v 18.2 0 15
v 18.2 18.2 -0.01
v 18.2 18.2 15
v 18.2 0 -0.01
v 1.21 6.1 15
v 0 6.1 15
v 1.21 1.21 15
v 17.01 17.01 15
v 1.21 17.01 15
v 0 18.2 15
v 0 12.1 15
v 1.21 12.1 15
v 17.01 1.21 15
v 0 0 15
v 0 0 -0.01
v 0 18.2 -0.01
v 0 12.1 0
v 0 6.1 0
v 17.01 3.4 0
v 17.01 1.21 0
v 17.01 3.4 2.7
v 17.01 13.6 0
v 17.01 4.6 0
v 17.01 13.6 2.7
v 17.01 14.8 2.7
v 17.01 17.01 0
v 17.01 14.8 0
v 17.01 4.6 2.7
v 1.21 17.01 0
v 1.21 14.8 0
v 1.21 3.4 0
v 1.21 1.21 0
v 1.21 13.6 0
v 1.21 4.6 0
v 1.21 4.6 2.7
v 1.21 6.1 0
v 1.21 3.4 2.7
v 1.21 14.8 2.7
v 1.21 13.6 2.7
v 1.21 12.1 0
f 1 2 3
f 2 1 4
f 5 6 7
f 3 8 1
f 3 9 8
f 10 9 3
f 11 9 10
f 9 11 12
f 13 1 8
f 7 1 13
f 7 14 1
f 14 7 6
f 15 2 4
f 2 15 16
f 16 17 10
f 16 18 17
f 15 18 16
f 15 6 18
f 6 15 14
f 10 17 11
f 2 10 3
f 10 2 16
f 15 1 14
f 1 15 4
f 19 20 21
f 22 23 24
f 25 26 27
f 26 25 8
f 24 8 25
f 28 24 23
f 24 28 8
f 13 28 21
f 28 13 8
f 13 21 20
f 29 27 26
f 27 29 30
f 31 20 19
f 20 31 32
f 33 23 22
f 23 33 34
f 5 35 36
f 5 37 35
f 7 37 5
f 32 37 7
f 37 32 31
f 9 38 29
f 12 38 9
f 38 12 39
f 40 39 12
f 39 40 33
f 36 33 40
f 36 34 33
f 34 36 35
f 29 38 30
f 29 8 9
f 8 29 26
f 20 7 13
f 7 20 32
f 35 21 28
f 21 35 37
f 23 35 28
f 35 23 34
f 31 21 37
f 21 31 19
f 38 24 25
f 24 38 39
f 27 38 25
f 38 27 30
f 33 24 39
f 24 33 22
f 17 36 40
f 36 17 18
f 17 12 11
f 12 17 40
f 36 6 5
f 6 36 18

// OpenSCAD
// file: ../Base/Rotation.scad
// Fischertechnik Box Foundation
// Geometry Helpers Rotation

include <PlacementOptions.scad>

// getRotatedSpace(space, rotation=NoRotation)
// Rotates the space dependent on the specified rotation

function getRotatedSpace(space, rotation=NoRotation) = [
    (rotation == Rotate90 || rotation == Rotate270) ? space.y : space.x,
    (rotation == Rotate90 || rotation == Rotate270) ? space.x : space.y
];

// Rotates the given space around the fixed left lower corner
// space = the space the children needs as width/depth list [width,depth]
// rotation = 0 Rotate0 degrees, 1 Rotate90 degrees, 2 Rotate180 degrees, 3 Rotate270 degrees (equivalent to -90)

module RotateFix(space, rotation=NoRotation) {
    dy = (rotation == Rotate0 || rotation == Rotate270) ? 0 :
        (rotation == Rotate90) ? space.x :
        space.y;
    dx = (rotation < Rotate180) ? 0 :
        (rotation == Rotate180) ? space.x :
        space.y;
    
    translate([dx, dy, 0])
        rotate([0, 0, rotations[rotation]])
            children();
}
// file: ../Base/Alignment.scad
// Fischertechnik Box Foundation
// Geometry Helpers Alignment

include <PlacementOptions.scad>

// getAlignedX(elementWidth, spaceWidth, align=AlignRight, offset=0)
// Gets the aligned X offset of an element with the given
// width in the given space.
// elementWidth = The width of the element to positon
// spaceWidth = The space where the element should be aligned
// align = 0 AlignLeft, 1 AlignCenter, 2 AlignRight
// offset = an optional offset from the aligned position. When
// aligned left or centered, then positive values are in X direction.
// When aligned right then positive values are in negative X direction.

function getAlignedX(elementWidth, spaceWidth, align=AlignRight, offset=0) =
    (align == AlignLeft) ?
        offset :
        ((align == AlignCenter) ?
        (spaceWidth - elementWidth)/2 + offset :
        spaceWidth - offset - elementWidth);

// getAlignedY(elementDepth, spaceDepth, align=AlignTop, offset=0)
// Gets the aligned Y offset of an element with the given
// depth in the given space.
// elementDepth = The depth of the element to positon
// spaceDepth = The space where the element should be aligned
// align = 0 AlignBottom, 1 AlignCenter, 2 AlignTop
// offset = an optional offset from the aligned position. When
// aligned bottom or centered, then positive values are in Y direction.
// When aligned top then positive values are in negative Y direction.

function getAlignedY(elementDepth, spaceDepth, align=AlignTop, offset=0) =
    (align == AlignBottom) ?
        offset :
        ((align == AlignCenter) ?
        (spaceDepth - elementDepth)/2 + offset :
        spaceDepth - offset - elementDepth);
// file: ../Base/PlacementOptions.scad
// Fischertechnik Box Foundation
// Placement Options

// Alignment
NoAlign = 0;
AlignLeft = 1;
AlignBottom = 2;
AlignCenter = 3;
AlignRight = 4;
AlignTop = 5;

// Element rotation degree steps
rotations = [0, -90, -180, -270];

// Rotation
NoRotation = 0;
Rotate0 = 0;
Rotate90 = 1;
Rotate180 = 2;
Rotate270 = 3;

// Docking (seen from above)
NoDock = -1;
DockLeft = 0;
DockTop = 1;
DockRight = 2;
DockCorner = 2;
DockBottom = 3;

// Web corners
LowerLeft = 0;
UpperLeft = 1;
UpperRight = 2;
LowerRight = 3;

// Web position relative to corner
LeftOfCorner = 0;
RightOfCorner = 1;
// file: ../Base/Boxes.scad
// Fischertechnik Box Foundation
// Pre-designed Boxes

use <Constants.scad>

include <PlacementOptions.scad>

box190Width = 190;
box190Depth = 130;
box130Width = 130;
box130Depth = 95;

// Values are from an original ec3 box
topBottomDifference = 1.5;
outerHeight = 40;
baseThickness = 1.8;
innerHeight = outerHeight - baseThickness;
stackExcess = 5.7;
radius = 3.5;
wallThickness = 1.5;
tolerance = 0.2;

boxWallThickness = wallThickness;
boxBaseThickness = baseThickness;
boxWebWidth = 3.0;

// getBoxWallThickness()
// Gets the wall thickness of a Fischertechnik Box
function getBoxWallThickness() = boxWallThickness;

// getBoxUsageHeight(height = 38.2)
// Gets the usable height of a Fischertechnik box
// height = Outer height of the box from the bottom to the upper edge.
function getBoxUsageHeight(height = outerHeight) = height - baseThickness - stackExcess;

// getBoxInnerHeight()
// Gets the inner height of a Fischertechnik box, including the stack excess
function getBoxInnerHeight() = innerHeight;

// getBoxBaseThickness()
// Gets the thickness of the Fischertechnik box base.
function getBoxBaseThickness() = boxBaseThickness;

// getBoxWebWidth()
// Gets the width of a box web
function getBoxWebWidth() = boxWebWidth;

// getBox190Space()
// Gets the usable inner space of a Box 190 as an x/y-list
function getBox190Space() = [
    box190Width - 2*getBoxWallThickness() - topBottomDifference, 
    box190Depth - 2*getBoxWallThickness() - topBottomDifference ];

// RoundedCornerPlate(width, depth, height, radius)
// Creates a body plate with rounded corners for a box. Used
// also to create the complete box with the hull module.
// width = Width of the plate
// depth = depth of the plate 
// height = thickness of the plate
// radius = radius of the rounded corner
module RoundedCornerPlate(width, depth, height, radius) {
    translate([radius, radius])
    hull() {
        w = width-2*radius;
        d = depth-2*radius;
        cube([w, d, height]);
        cylinder(height, r=radius, $fn=getFragments());
        translate([w, 0])
            cylinder(height, r=radius, $fn=getFragments());
        translate([w, d])
            cylinder(height, r=radius, $fn=getFragments());
        translate([0, d])
            cylinder(height, r=radius, $fn=getFragments());
    }
}

// BoxBase(width, depth)
// Creates an empty stackable Fischertechnik compatible box
// width = Outer width of the box (190, 130, ...)
// depth = Outer depth of the box (130, 95, ...)

module BoxBase(width, depth, height=outerHeight) {    
    thinPlate = 0.01;

    innerHeight = height - baseThickness;    
    
    module Body(tolerance=tolerance) {
        hull() {
            // Bottom with tolerance to fit into the original boxes when stacked
            translate([-wallThickness+tolerance, -wallThickness+tolerance, -baseThickness])
                RoundedCornerPlate(width-topBottomDifference-2*tolerance, depth-topBottomDifference-2*tolerance, thinPlate, radius);
            
            // Top
            translate([-wallThickness-topBottomDifference/2, -wallThickness-topBottomDifference/2, innerHeight-thinPlate])
                RoundedCornerPlate(width, depth, thinPlate, radius);
         }
    }

    module Cutoff() {
        hull() {
            coWidth = width - 2*wallThickness;
            coDepth = depth - 2*wallThickness;
            
            // Bottom
            RoundedCornerPlate(coWidth-topBottomDifference, coDepth-topBottomDifference, thinPlate, radius);

            // Top
            translate([-topBottomDifference/2, -topBottomDifference/2, innerHeight+thinPlate]) 
                RoundedCornerPlate(coWidth, coDepth, thinPlate, radius);
        }
    }
    
    difference() {        
        Body();
        Cutoff();
        stackOffset = innerHeight - stackExcess;
        translate([0, 0, stackOffset + baseThickness])
            Body(tolerance=0);
    }
}

// Creates the Fischertechnik empty box 130x190 mm and places it at position 0,0
// 190x130 are the outer sizes, the inner space is slightly smaller. Use getBox190Space() to get the inner sizes.
// The box is positioned that the usable inner space is at the 0,0,0 position.

module Box190() {
    BoxBase(box190Width, box190Depth);
}

// Gets the usable inner space of a Box 130 as an x/y-list
function getBox130Space() = [
    box130Width - 2*getBoxWallThickness() - topBottomDifference, 
    box130Depth - 2*getBoxWallThickness() - topBottomDifference ];

// Creates the Fischertechnik empty box 95x130 mm and places it at position 0,0
// 190x130 are the outer sizes, the inner space is slightly smaller. Use getBox190Space() to get the inner sizes.
// The box is positioned that the usable inner space is at the 0,0,0 position.

module Box130() {
    BoxBase(box130Width, box130Depth);
}

// Creates a web at the specified box walls
// corner 0 = LowerLeft, 1 = UpperLeft, 2 = UpperRight, 3 = LowerRight
// side 0 = LeftOfCorner, 1 = RightOfCorner
// distance = Distance in mm from the corner
// boxSpace = inner width and depth of the box (default: Box 190)
// webWidth = length of the web (default is 3 mms)
// webThickness = thickness of the web (default is 1 mm)
// height = Height of the web (standard is getBoxUsageHeight())
// sink = How much of the web is sunk into the wall

module BoxWeb(
    corner, 
    side, 
    distance, 
    boxSpace=getBox190Space(), 
    webWidth=getBoxWebWidth(), 
    webThickness=1.0, 
    height=getBoxUsageHeight(),
    sink = getBoxWallThickness()/2) {
    width = (corner % 2 == 0) ? 
            (side == LeftOfCorner ? webWidth : webThickness) :
            (side == LeftOfCorner ? webThickness : webWidth);

    depth = (corner % 2 == 0) ? 
            (side == RightOfCorner ? webWidth : webThickness) :
            (side == RightOfCorner ? webThickness : webWidth);
    
    xDiff = corner == LowerLeft ? 
                (side == LeftOfCorner ? -sink : distance) :
            (corner == UpperLeft ?                
                (side == LeftOfCorner ? distance : -sink) :
            (corner == UpperRight ?
                (side == LeftOfCorner ? boxSpace.x-webWidth+sink : boxSpace.x-distance-webThickness) :
                (side == LeftOfCorner ? boxSpace.x-distance-webThickness: boxSpace.x-webWidth+sink)));

    yDiff = corner == LowerLeft ? 
                (side == RightOfCorner ? -sink : distance) :
            (corner == UpperLeft ?
                (side == RightOfCorner ? boxSpace.y-distance-webThickness : boxSpace.y-webWidth+sink) :
            (corner == UpperRight ?
                (side == RightOfCorner ? boxSpace.y-webWidth+sink : boxSpace.y-distance-webThickness) :
                (side == RightOfCorner ? distance : -sink)));
    
    translate([xDiff, yDiff, -getExcess()])
        cube([width, depth, height + 2*getExcess()]);
}
// file: ../Base/Placement.scad
// Fischertechnik Box Foundation
// Geometry Helpers Placement

use <Constants.scad>
use <Alignment.scad>
use <Rotation.scad>
use <Boxes.scad>

include <PlacementOptions.scad>

// Place(x=0, y=0, elementSpace=[0,0], alignX=AlignLeft, alignY=AlignBottom, rotation=Rotate0, boxSpace=getBox190Space())
// Places the child at the specified position
// y = Y-Position. This is a relative position when an X aligment is specified.
// x = X-Position. This is a relative position when an Y aligment is specified.
// elementSpace = space of the element to be placed [x,y]
// alignX = -1=NoAlign, 0 AlignLeft, 1 AlignCenter, 3 AlignRight (elementSpace and boxSpace required!)
// alignY = -1=NoAlign, 2 AlignBottom, 1 AlignCenter, 4 AlignTop (elementSpace and boxSpace required!)
// rotation = 0 Rotate0 0 degrees, 1 Rotate90 90 degrees, 
// 2 Rotate180 180 degrees, 3 Rotate270 270 degrees (equivalent to -90)
// boxSpace = Inner space of the box where the placement occurs [x,y] - default is Box 190x130 inner space

module Place(x=0, y=0, elementSpace=[0,0], 
  alignX=AlignLeft, alignY=AlignBottom, 
  rotation=NoRotation, boxSpace=getBox190Space()) {

    module Position(x, y, space, rotation=Rotate0) {
        translate([x, y, 0])
            RotateFix(space, rotation)
                children();
    }

    space = getRotatedSpace(elementSpace, rotation);
    alignedX = getAlignedX(space.x, boxSpace.x, alignX, x);
    alignedY = getAlignedY(space.y, boxSpace.y, alignY, y);
    Position(alignedX, alignedY, elementSpace, rotation)
        children();
}

// Center(space=getBox130Space(), elementSpace=[0,0])
// space = Space where the children is centered. For cylinder use centered=true and no elementSpace.
// elementSpace = space of the element to be centered [x,y]

module Center(space=getBox190Space(), elementSpace=[0,0]) {
    Place(elementSpace=elementSpace, boxSpace=space, alignX=AlignCenter, alignY=AlignCenter)
        children();
}

// CenterHorizontal(width=0, y=0, offset=0, space=getBox130Space())
// width = Width of the element to be placed.
// y = Y position of the element
// offset = Offset from the center position (negative will be left of the center)
// space = Space where the element is placed

module CenterHorizontal(width=0, y=0, offset=0, space=getBox190Space()) {
    Place(x=offset, y=y, elementSpace=[width, 0], boxSpace=space, alignX=AlignCenter)
        children(0);
}

// CenterVertical(depth=0, x=0, offset=0, space=getBox130Space())
// depth = Depth of the element to be placed.
// x = X position of the element
// offset = Offset from the center position (negative will be down of the center)
// space = Space where the element is placed

module CenterVertical(depth=0, x=0, offset=0, space=getBox190Space()) {
    Place(x=x, y=offset, elementSpace=[0, depth], boxSpace=space, alignY=AlignCenter)
        children(0);
}

// getIsVertical(align)
// True if the specified alignment needs a vertical orientation for a divider (AlignRight, AlignLeft)

function getIsVertical(align) = (align == AlignRight || align == AlignLeft);

// getIsHorizontal(align)
// True if the specified alignment needs a horizontal orientation for a divider (AlignTop, AlignBottom)

function getIsHorizontal(align) = (align == AlignTop || align == AlignBottom);
// file: FrameBlockWithPin.scad
// Fischertechnik Box Library
// Frame for Building Blocks with Connector
// 38240, 37636

use <../Base/Constants.scad>
use <../ModelBase/Simple.scad>

/* [Element Parameters] */
count = 1;
height = 8;

/* [Hidden] */
width = 15;
depth = 15;

// getFrameBlockWithPinSpace()
// Gets the space the frame block with pin needs as width (.x and .y as a list)
// for the specified count of blocks

function getFrameBlockWithPinSpace(count = 1) = getFrameOuterVolume([width * count, depth, height]);

// FrameBlockWithPin(count, height=8)
// Frame for count standing building blocks with pin down
// count = Count of blocks
// height = Height of the frame (default is 8)

module FrameBlockWithPin(count = 1, height=height) {
    railWidth = getFrameBlockWithPinSpace(count).x;
    railHeight = 2.7;
    railDistance = 9;
    
    module Rails() {
        Wall([railWidth, getDividerThickness(), railHeight]);
        translate([0, railDistance + getDividerThickness()])
            Wall([railWidth, getDividerThickness(), railHeight]);
    }

    Frame([width*count, depth, height]);

    railsDepth = railDistance + 2*getDividerThickness();

    translate([0, (getFrameBlockWithPinSpace(count).y - railsDepth) / 2]) 
        Rails();
}

// Test
color("lightgray")
FrameBlockWithPin(count);
// file: ../Base/Constants.scad
// Fischertechnik Box Foundation
// Constants

// Constant values necessary for multiple elements

// Base constants
dividerThickness = 1.2;
excess = 0.01;
fragments = 90;
tolerance = 0.8;

// Gets the thickness of a divider 
function getDividerThickness() = dividerThickness;

// Gets the excess that is used to merge walls into each other
function getExcess() = excess;

// Gets amount of fragments of a cylinder
function getFragments() = fragments;

// Gets the inner tolerance of a frame to each side
function getTolerance() = tolerance;


// Fischertechnik specific constants
axisDiameter = 4;
axisBottomDiameter = axisDiameter + 1;
axisTolerance = 0.2;

// Gets axis diameter of Fischertechnik axis
function getAxisDiameter() = axisDiameter;

// Gets axis diameter tolerance (subtracted for element axis)
function getAxisTolerance() = axisTolerance;

// Gets the axis diameter for standing axis
function getStandAxisDiameter() = getAxisDiameter() - getAxisTolerance();

// Gets axis bottom diameter for thicker part at the bottom
function getAxisBottomDiameter() = axisBottomDiameter;

pinHeight = 2.5;

// gets the height of a connecting pin
function getPinHeight() = pinHeight;

standardEdgeDistance = 2.5;
standardWebDistance = 11.5;
standardCornerLength = 15;

// gets the standard distance to the wall of the box for dockable frames with webs
function getStandardEdgeDistance() = standardEdgeDistance;

// gets the standard distance of each web to the corner of the dockable frame
function getStandardWebDistance() = standardWebDistance;

// gets the standard length of the corner walls of a dockable frame
function getStandardCornerLength() = standardCornerLength;

tubeWallFactor = 0.8;

// gets the wall thickness of a tube.
function getTubeWallThickness() = tubeWallFactor * getDividerThickness();

smallPartsFrameHeight = 20;

// gets the frame height for docked small parts boxes.
function getSmallPartsFrameHeight() = smallPartsFrameHeight;

hubRingDiameter = 19.5;
hubRingLevelDiameter = 21;

// gets the diameter of a tube matching the inner ring of a wheel
function getHubRingDiameter() = hubRingDiameter;

// gets the diameter of a hub tube with a thicker diameter
function getHubRingLevelDiameter() = hubRingLevelDiameter;
// main file
// Fischertechnik Box Library
// Frame for Light Resistor 30
// 31361

use <../Base/Constants.scad>
use <../ModelBase/Simple.scad>
use <FrameBlockWithPin.scad>

/* [Hidden] */
width = 15;
depth = 15;
height = 15;

// getFramePhotoResistor30Space()
// Gets the space the frame for photo resistor 30 needs as width (.x and .y as a list)

function getFramePhotoResistor30Space() = getFrameOuterVolume([width, depth, height]);

// FramePhotoResistor30()
// Frame for photo resistor 30

module FramePhotoResistor30() {
    gapWidth = 6;
    
    difference() {
        FrameBlockWithPin(height=height);
        translate([-getDividerThickness()/2,(getFramePhotoResistor30Space().y-gapWidth)/2])
            cube([getDividerThickness()*2, gapWidth, height + 1]);
    }
}

// Test
color("lightgray") {
    FramePhotoResistor30();
}
